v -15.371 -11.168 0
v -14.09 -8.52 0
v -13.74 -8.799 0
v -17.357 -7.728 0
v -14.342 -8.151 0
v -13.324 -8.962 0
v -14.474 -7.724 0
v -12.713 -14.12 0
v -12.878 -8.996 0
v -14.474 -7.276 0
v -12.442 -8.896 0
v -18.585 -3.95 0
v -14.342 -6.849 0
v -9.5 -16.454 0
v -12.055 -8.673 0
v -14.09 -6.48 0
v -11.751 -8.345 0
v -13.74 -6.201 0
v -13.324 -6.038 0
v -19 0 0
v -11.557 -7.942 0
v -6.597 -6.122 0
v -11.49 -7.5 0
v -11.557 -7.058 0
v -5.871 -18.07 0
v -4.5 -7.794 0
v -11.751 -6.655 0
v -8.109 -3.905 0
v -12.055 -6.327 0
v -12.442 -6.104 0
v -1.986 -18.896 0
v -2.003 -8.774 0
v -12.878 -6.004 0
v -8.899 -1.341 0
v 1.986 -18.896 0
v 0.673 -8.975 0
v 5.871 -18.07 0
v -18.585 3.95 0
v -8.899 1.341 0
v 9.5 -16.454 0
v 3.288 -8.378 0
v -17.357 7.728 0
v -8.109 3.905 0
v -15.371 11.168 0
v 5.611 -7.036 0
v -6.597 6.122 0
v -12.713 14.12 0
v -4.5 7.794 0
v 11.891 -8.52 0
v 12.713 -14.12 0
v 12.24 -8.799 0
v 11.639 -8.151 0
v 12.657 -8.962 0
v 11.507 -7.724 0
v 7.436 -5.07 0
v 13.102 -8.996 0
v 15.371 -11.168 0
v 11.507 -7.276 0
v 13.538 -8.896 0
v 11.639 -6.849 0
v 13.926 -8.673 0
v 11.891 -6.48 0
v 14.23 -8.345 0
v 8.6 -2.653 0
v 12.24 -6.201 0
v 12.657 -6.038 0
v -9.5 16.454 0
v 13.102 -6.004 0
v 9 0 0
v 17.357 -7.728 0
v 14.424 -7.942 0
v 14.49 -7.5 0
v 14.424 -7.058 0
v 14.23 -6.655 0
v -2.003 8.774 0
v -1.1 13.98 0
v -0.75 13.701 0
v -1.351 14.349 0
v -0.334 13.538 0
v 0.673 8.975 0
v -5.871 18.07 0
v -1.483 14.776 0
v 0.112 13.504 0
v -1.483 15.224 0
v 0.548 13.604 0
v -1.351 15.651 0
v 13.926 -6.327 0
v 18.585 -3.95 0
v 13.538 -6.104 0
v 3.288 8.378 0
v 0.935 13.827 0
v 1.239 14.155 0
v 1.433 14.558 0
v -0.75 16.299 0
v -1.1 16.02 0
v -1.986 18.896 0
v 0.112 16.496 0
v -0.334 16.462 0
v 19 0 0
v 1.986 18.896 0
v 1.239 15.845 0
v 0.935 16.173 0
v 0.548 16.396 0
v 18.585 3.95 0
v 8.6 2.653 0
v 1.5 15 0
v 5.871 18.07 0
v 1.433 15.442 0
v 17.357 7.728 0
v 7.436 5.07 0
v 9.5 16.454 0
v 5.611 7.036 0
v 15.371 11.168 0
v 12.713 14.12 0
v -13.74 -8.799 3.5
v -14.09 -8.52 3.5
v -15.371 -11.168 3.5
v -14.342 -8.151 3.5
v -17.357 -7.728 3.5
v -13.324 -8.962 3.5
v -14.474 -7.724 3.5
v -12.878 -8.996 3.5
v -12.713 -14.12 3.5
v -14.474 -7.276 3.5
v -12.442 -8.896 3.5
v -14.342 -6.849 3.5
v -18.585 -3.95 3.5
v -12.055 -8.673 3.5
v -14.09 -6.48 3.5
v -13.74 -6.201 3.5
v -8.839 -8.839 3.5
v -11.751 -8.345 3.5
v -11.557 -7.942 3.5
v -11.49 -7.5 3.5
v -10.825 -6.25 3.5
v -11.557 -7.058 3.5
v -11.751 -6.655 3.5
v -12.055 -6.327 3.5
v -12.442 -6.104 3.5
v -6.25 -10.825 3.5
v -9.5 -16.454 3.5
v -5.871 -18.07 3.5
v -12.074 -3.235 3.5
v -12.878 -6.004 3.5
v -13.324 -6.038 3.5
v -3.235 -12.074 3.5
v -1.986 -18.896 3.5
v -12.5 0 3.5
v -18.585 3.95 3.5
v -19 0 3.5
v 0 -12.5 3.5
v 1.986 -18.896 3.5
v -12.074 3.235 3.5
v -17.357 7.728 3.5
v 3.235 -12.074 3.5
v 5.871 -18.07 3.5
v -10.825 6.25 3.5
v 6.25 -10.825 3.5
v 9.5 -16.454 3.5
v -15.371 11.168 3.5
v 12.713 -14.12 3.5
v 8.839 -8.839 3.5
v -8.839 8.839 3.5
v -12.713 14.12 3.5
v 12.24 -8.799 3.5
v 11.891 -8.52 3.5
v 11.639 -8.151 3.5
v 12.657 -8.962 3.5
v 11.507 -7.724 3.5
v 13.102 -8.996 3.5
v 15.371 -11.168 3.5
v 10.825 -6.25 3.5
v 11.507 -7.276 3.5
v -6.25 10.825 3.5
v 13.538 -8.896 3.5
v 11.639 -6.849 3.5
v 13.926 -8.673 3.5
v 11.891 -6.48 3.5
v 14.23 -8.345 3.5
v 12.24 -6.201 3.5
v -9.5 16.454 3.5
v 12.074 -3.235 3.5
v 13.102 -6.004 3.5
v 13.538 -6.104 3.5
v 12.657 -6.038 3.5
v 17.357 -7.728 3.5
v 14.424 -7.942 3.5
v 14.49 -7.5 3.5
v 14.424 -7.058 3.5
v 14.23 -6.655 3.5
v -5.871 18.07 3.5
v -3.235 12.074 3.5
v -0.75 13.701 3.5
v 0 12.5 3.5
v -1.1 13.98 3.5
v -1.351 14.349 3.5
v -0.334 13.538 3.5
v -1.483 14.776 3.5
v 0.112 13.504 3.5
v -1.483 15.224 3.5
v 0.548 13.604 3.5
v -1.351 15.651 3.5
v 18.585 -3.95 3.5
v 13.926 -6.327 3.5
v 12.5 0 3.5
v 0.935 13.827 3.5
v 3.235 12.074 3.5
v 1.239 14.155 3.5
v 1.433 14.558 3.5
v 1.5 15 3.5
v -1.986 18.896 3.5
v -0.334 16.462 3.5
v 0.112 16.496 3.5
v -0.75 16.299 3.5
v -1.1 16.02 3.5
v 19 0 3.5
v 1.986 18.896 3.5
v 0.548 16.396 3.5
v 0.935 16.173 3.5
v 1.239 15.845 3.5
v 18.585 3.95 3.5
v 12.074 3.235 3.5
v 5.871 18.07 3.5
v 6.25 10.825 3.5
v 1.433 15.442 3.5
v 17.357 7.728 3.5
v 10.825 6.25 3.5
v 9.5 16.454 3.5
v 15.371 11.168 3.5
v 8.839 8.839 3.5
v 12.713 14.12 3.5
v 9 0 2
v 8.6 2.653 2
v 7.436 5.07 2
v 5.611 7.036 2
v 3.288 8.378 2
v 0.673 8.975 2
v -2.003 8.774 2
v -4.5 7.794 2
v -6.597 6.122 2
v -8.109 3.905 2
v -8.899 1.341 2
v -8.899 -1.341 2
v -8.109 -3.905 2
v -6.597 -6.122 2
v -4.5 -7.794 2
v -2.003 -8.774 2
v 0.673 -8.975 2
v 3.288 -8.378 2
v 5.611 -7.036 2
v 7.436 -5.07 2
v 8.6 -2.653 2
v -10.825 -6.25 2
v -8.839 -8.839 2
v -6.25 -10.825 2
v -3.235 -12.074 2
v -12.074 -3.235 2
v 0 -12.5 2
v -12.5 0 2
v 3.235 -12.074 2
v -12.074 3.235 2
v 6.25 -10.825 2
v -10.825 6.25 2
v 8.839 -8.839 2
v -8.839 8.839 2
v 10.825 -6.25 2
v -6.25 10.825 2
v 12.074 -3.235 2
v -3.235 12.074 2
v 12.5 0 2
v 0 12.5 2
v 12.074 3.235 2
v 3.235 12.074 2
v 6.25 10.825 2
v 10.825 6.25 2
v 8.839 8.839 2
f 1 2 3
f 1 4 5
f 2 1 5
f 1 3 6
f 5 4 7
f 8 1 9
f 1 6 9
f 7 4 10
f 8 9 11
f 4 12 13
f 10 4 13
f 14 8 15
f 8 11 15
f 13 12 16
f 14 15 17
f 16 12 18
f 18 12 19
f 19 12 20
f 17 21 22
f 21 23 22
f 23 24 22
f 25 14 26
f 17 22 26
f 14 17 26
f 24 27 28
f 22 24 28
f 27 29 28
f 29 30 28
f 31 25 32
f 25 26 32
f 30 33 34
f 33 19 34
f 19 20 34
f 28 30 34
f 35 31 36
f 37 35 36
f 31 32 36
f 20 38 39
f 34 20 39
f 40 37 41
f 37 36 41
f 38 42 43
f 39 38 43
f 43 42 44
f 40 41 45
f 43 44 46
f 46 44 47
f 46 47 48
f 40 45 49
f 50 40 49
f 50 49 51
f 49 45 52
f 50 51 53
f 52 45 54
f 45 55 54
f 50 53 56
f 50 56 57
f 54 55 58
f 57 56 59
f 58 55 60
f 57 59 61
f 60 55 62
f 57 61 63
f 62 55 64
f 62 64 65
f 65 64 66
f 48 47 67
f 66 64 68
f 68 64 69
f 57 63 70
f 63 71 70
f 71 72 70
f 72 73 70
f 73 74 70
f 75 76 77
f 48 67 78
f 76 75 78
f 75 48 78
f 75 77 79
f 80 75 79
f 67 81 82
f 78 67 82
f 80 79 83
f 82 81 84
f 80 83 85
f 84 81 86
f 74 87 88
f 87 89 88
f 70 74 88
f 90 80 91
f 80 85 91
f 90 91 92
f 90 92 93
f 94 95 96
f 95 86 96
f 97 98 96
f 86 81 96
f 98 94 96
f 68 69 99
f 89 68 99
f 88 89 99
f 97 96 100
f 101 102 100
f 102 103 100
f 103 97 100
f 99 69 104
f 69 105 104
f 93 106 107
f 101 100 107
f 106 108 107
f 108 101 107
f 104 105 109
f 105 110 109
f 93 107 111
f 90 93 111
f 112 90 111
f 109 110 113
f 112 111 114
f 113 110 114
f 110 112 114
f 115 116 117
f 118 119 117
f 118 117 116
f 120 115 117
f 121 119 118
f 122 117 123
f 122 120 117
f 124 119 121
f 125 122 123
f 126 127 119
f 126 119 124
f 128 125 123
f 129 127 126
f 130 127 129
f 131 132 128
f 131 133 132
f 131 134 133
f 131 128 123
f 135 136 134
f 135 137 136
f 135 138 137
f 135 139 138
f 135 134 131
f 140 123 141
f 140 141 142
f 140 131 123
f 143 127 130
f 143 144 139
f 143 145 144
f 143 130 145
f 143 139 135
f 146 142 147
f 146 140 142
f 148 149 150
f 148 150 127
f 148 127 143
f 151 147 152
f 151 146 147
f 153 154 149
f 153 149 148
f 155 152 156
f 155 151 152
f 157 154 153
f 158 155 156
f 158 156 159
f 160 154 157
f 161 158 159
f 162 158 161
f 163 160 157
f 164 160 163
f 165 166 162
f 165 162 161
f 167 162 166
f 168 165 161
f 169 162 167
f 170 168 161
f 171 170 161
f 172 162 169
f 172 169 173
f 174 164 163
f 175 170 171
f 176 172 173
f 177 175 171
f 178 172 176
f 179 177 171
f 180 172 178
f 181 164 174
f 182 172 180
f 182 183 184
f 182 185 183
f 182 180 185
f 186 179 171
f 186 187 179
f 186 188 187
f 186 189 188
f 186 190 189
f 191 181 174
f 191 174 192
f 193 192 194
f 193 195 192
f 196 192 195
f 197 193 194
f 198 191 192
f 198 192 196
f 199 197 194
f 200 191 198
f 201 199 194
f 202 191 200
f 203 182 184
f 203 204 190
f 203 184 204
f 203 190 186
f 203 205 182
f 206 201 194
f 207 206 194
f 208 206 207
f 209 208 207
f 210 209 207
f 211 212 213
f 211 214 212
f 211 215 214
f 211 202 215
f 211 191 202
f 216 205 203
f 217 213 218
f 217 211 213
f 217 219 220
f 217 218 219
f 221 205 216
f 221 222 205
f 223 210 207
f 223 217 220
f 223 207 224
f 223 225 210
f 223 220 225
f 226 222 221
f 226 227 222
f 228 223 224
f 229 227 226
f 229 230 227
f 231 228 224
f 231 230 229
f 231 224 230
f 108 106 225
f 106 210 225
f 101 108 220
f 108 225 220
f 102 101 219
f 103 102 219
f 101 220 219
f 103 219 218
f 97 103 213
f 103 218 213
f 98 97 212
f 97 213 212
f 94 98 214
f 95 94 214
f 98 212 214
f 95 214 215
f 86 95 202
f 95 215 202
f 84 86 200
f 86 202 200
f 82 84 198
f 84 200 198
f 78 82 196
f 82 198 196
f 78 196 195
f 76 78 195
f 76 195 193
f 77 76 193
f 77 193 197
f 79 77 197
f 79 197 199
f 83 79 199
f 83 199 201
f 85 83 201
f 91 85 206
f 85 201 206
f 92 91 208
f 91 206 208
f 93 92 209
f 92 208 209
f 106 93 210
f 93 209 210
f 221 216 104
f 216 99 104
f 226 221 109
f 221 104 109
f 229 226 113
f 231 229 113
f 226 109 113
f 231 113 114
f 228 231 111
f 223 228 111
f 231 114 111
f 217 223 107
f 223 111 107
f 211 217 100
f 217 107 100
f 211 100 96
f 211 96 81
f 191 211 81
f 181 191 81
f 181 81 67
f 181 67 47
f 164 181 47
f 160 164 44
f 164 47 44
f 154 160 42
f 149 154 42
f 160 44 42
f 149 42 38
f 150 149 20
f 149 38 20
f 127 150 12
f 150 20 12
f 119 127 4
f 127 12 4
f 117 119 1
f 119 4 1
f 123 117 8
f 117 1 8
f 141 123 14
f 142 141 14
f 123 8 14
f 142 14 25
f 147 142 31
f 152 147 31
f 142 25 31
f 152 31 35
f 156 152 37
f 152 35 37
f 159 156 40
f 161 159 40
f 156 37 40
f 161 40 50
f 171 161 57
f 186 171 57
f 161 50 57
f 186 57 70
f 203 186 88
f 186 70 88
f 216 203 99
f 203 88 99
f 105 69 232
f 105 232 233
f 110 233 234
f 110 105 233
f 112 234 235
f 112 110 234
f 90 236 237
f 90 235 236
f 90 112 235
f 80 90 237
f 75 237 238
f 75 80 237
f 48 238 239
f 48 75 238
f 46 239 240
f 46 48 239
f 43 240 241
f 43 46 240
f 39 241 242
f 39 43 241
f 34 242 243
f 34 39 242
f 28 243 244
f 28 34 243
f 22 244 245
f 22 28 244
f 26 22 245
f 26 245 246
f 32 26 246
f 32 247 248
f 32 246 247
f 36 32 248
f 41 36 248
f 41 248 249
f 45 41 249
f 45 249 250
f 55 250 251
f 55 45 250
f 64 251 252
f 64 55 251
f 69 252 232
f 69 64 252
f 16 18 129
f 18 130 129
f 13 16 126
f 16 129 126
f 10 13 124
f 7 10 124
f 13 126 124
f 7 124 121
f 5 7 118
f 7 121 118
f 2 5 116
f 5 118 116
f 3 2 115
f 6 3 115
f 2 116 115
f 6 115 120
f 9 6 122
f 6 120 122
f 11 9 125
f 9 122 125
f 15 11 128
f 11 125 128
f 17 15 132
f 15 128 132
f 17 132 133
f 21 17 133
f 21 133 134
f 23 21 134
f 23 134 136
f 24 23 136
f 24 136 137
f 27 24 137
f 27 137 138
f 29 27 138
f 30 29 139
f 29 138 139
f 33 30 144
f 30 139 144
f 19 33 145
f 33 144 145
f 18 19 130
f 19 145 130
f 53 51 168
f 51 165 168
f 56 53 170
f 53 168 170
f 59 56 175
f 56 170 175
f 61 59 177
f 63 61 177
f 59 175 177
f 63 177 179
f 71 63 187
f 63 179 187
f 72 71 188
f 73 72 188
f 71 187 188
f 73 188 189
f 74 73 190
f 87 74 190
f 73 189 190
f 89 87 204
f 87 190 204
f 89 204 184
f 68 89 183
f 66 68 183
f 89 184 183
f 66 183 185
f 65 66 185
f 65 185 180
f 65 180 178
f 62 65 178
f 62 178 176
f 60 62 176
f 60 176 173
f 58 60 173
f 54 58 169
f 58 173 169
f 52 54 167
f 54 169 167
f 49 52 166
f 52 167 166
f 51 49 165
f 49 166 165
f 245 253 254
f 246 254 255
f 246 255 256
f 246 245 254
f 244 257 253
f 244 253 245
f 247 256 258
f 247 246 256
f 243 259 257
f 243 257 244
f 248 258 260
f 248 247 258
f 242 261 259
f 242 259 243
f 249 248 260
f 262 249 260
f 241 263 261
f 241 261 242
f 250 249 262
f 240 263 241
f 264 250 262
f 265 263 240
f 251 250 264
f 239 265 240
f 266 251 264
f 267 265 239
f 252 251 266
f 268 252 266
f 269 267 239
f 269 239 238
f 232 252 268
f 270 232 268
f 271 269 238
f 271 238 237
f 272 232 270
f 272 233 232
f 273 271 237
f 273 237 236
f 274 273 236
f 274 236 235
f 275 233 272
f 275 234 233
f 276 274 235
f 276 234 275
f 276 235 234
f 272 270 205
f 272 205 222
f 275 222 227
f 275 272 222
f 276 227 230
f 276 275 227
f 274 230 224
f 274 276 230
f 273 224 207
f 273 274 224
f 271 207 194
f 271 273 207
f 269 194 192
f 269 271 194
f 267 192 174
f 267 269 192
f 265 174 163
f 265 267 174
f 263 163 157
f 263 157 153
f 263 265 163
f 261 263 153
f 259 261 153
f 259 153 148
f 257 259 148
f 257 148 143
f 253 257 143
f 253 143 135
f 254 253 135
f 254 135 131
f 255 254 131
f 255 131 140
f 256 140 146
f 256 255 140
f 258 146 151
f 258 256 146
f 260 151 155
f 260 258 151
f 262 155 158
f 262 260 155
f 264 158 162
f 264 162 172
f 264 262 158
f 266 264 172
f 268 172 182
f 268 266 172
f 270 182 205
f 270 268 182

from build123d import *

# Parameters (mm, degrees)
SKETCH1_R               = 19
BOSS_EXTRUDE1_DEPTH     = 2
SKETCH2_R               = 19
SKETCH2_R_2             = 12.5
BOSS_EXTRUDE2_DEPTH     = 1.5
CUT_EXTRUDE1_DEPTH      = 27.944387171
CUT_EXTRUDE1_DEPTH_BACK = 27.944387171
SKETCH3_R               = 9
SKETCH4_R               = 1.5
CUT_EXTRUDE2_DEPTH      = 28.09704781
CIRPATTERN1_COUNT       = 3


with BuildPart() as part:
    # Sketch1 → Boss-Extrude1 (new body)
    with BuildSketch(Plane.XY):
        Circle(SKETCH1_R)
    extrude(amount=BOSS_EXTRUDE1_DEPTH)

    # Sketch2 → Boss-Extrude2 (add)
    with BuildSketch(Plane.XY.offset(2)):
        Circle(SKETCH2_R)
        Circle(SKETCH2_R_2, mode=Mode.SUBTRACT)
    extrude(amount=BOSS_EXTRUDE2_DEPTH)

    # Sketch3 → Cut-Extrude1 (cut, two sides: drawn at the far end of the back side and taken through both)
    with BuildSketch(Plane.XY.offset(2).offset(-CUT_EXTRUDE1_DEPTH_BACK)):
        Circle(SKETCH3_R)
    extrude(amount=CUT_EXTRUDE1_DEPTH + CUT_EXTRUDE1_DEPTH_BACK, mode=Mode.SUBTRACT)

    # Sketch4 → Cut-Extrude2 (cut, symmetric)
    with BuildSketch(Plane.XY):
        with Locations((0, 15)):
            Circle(SKETCH4_R)
    cut_extrude2 = extrude(amount=CUT_EXTRUDE2_DEPTH, both=True, mode=Mode.SUBTRACT)

    # CirPattern1: Cut-Extrude2 ×3 about axis
    cirpattern1_axis = Axis((0, 0, 0), (0, 0, 1))
    for i in range(1, CIRPATTERN1_COUNT):
        add(cut_extrude2.rotate(cirpattern1_axis, i * 360 / CIRPATTERN1_COUNT), mode=Mode.SUBTRACT)


solid = part.part
